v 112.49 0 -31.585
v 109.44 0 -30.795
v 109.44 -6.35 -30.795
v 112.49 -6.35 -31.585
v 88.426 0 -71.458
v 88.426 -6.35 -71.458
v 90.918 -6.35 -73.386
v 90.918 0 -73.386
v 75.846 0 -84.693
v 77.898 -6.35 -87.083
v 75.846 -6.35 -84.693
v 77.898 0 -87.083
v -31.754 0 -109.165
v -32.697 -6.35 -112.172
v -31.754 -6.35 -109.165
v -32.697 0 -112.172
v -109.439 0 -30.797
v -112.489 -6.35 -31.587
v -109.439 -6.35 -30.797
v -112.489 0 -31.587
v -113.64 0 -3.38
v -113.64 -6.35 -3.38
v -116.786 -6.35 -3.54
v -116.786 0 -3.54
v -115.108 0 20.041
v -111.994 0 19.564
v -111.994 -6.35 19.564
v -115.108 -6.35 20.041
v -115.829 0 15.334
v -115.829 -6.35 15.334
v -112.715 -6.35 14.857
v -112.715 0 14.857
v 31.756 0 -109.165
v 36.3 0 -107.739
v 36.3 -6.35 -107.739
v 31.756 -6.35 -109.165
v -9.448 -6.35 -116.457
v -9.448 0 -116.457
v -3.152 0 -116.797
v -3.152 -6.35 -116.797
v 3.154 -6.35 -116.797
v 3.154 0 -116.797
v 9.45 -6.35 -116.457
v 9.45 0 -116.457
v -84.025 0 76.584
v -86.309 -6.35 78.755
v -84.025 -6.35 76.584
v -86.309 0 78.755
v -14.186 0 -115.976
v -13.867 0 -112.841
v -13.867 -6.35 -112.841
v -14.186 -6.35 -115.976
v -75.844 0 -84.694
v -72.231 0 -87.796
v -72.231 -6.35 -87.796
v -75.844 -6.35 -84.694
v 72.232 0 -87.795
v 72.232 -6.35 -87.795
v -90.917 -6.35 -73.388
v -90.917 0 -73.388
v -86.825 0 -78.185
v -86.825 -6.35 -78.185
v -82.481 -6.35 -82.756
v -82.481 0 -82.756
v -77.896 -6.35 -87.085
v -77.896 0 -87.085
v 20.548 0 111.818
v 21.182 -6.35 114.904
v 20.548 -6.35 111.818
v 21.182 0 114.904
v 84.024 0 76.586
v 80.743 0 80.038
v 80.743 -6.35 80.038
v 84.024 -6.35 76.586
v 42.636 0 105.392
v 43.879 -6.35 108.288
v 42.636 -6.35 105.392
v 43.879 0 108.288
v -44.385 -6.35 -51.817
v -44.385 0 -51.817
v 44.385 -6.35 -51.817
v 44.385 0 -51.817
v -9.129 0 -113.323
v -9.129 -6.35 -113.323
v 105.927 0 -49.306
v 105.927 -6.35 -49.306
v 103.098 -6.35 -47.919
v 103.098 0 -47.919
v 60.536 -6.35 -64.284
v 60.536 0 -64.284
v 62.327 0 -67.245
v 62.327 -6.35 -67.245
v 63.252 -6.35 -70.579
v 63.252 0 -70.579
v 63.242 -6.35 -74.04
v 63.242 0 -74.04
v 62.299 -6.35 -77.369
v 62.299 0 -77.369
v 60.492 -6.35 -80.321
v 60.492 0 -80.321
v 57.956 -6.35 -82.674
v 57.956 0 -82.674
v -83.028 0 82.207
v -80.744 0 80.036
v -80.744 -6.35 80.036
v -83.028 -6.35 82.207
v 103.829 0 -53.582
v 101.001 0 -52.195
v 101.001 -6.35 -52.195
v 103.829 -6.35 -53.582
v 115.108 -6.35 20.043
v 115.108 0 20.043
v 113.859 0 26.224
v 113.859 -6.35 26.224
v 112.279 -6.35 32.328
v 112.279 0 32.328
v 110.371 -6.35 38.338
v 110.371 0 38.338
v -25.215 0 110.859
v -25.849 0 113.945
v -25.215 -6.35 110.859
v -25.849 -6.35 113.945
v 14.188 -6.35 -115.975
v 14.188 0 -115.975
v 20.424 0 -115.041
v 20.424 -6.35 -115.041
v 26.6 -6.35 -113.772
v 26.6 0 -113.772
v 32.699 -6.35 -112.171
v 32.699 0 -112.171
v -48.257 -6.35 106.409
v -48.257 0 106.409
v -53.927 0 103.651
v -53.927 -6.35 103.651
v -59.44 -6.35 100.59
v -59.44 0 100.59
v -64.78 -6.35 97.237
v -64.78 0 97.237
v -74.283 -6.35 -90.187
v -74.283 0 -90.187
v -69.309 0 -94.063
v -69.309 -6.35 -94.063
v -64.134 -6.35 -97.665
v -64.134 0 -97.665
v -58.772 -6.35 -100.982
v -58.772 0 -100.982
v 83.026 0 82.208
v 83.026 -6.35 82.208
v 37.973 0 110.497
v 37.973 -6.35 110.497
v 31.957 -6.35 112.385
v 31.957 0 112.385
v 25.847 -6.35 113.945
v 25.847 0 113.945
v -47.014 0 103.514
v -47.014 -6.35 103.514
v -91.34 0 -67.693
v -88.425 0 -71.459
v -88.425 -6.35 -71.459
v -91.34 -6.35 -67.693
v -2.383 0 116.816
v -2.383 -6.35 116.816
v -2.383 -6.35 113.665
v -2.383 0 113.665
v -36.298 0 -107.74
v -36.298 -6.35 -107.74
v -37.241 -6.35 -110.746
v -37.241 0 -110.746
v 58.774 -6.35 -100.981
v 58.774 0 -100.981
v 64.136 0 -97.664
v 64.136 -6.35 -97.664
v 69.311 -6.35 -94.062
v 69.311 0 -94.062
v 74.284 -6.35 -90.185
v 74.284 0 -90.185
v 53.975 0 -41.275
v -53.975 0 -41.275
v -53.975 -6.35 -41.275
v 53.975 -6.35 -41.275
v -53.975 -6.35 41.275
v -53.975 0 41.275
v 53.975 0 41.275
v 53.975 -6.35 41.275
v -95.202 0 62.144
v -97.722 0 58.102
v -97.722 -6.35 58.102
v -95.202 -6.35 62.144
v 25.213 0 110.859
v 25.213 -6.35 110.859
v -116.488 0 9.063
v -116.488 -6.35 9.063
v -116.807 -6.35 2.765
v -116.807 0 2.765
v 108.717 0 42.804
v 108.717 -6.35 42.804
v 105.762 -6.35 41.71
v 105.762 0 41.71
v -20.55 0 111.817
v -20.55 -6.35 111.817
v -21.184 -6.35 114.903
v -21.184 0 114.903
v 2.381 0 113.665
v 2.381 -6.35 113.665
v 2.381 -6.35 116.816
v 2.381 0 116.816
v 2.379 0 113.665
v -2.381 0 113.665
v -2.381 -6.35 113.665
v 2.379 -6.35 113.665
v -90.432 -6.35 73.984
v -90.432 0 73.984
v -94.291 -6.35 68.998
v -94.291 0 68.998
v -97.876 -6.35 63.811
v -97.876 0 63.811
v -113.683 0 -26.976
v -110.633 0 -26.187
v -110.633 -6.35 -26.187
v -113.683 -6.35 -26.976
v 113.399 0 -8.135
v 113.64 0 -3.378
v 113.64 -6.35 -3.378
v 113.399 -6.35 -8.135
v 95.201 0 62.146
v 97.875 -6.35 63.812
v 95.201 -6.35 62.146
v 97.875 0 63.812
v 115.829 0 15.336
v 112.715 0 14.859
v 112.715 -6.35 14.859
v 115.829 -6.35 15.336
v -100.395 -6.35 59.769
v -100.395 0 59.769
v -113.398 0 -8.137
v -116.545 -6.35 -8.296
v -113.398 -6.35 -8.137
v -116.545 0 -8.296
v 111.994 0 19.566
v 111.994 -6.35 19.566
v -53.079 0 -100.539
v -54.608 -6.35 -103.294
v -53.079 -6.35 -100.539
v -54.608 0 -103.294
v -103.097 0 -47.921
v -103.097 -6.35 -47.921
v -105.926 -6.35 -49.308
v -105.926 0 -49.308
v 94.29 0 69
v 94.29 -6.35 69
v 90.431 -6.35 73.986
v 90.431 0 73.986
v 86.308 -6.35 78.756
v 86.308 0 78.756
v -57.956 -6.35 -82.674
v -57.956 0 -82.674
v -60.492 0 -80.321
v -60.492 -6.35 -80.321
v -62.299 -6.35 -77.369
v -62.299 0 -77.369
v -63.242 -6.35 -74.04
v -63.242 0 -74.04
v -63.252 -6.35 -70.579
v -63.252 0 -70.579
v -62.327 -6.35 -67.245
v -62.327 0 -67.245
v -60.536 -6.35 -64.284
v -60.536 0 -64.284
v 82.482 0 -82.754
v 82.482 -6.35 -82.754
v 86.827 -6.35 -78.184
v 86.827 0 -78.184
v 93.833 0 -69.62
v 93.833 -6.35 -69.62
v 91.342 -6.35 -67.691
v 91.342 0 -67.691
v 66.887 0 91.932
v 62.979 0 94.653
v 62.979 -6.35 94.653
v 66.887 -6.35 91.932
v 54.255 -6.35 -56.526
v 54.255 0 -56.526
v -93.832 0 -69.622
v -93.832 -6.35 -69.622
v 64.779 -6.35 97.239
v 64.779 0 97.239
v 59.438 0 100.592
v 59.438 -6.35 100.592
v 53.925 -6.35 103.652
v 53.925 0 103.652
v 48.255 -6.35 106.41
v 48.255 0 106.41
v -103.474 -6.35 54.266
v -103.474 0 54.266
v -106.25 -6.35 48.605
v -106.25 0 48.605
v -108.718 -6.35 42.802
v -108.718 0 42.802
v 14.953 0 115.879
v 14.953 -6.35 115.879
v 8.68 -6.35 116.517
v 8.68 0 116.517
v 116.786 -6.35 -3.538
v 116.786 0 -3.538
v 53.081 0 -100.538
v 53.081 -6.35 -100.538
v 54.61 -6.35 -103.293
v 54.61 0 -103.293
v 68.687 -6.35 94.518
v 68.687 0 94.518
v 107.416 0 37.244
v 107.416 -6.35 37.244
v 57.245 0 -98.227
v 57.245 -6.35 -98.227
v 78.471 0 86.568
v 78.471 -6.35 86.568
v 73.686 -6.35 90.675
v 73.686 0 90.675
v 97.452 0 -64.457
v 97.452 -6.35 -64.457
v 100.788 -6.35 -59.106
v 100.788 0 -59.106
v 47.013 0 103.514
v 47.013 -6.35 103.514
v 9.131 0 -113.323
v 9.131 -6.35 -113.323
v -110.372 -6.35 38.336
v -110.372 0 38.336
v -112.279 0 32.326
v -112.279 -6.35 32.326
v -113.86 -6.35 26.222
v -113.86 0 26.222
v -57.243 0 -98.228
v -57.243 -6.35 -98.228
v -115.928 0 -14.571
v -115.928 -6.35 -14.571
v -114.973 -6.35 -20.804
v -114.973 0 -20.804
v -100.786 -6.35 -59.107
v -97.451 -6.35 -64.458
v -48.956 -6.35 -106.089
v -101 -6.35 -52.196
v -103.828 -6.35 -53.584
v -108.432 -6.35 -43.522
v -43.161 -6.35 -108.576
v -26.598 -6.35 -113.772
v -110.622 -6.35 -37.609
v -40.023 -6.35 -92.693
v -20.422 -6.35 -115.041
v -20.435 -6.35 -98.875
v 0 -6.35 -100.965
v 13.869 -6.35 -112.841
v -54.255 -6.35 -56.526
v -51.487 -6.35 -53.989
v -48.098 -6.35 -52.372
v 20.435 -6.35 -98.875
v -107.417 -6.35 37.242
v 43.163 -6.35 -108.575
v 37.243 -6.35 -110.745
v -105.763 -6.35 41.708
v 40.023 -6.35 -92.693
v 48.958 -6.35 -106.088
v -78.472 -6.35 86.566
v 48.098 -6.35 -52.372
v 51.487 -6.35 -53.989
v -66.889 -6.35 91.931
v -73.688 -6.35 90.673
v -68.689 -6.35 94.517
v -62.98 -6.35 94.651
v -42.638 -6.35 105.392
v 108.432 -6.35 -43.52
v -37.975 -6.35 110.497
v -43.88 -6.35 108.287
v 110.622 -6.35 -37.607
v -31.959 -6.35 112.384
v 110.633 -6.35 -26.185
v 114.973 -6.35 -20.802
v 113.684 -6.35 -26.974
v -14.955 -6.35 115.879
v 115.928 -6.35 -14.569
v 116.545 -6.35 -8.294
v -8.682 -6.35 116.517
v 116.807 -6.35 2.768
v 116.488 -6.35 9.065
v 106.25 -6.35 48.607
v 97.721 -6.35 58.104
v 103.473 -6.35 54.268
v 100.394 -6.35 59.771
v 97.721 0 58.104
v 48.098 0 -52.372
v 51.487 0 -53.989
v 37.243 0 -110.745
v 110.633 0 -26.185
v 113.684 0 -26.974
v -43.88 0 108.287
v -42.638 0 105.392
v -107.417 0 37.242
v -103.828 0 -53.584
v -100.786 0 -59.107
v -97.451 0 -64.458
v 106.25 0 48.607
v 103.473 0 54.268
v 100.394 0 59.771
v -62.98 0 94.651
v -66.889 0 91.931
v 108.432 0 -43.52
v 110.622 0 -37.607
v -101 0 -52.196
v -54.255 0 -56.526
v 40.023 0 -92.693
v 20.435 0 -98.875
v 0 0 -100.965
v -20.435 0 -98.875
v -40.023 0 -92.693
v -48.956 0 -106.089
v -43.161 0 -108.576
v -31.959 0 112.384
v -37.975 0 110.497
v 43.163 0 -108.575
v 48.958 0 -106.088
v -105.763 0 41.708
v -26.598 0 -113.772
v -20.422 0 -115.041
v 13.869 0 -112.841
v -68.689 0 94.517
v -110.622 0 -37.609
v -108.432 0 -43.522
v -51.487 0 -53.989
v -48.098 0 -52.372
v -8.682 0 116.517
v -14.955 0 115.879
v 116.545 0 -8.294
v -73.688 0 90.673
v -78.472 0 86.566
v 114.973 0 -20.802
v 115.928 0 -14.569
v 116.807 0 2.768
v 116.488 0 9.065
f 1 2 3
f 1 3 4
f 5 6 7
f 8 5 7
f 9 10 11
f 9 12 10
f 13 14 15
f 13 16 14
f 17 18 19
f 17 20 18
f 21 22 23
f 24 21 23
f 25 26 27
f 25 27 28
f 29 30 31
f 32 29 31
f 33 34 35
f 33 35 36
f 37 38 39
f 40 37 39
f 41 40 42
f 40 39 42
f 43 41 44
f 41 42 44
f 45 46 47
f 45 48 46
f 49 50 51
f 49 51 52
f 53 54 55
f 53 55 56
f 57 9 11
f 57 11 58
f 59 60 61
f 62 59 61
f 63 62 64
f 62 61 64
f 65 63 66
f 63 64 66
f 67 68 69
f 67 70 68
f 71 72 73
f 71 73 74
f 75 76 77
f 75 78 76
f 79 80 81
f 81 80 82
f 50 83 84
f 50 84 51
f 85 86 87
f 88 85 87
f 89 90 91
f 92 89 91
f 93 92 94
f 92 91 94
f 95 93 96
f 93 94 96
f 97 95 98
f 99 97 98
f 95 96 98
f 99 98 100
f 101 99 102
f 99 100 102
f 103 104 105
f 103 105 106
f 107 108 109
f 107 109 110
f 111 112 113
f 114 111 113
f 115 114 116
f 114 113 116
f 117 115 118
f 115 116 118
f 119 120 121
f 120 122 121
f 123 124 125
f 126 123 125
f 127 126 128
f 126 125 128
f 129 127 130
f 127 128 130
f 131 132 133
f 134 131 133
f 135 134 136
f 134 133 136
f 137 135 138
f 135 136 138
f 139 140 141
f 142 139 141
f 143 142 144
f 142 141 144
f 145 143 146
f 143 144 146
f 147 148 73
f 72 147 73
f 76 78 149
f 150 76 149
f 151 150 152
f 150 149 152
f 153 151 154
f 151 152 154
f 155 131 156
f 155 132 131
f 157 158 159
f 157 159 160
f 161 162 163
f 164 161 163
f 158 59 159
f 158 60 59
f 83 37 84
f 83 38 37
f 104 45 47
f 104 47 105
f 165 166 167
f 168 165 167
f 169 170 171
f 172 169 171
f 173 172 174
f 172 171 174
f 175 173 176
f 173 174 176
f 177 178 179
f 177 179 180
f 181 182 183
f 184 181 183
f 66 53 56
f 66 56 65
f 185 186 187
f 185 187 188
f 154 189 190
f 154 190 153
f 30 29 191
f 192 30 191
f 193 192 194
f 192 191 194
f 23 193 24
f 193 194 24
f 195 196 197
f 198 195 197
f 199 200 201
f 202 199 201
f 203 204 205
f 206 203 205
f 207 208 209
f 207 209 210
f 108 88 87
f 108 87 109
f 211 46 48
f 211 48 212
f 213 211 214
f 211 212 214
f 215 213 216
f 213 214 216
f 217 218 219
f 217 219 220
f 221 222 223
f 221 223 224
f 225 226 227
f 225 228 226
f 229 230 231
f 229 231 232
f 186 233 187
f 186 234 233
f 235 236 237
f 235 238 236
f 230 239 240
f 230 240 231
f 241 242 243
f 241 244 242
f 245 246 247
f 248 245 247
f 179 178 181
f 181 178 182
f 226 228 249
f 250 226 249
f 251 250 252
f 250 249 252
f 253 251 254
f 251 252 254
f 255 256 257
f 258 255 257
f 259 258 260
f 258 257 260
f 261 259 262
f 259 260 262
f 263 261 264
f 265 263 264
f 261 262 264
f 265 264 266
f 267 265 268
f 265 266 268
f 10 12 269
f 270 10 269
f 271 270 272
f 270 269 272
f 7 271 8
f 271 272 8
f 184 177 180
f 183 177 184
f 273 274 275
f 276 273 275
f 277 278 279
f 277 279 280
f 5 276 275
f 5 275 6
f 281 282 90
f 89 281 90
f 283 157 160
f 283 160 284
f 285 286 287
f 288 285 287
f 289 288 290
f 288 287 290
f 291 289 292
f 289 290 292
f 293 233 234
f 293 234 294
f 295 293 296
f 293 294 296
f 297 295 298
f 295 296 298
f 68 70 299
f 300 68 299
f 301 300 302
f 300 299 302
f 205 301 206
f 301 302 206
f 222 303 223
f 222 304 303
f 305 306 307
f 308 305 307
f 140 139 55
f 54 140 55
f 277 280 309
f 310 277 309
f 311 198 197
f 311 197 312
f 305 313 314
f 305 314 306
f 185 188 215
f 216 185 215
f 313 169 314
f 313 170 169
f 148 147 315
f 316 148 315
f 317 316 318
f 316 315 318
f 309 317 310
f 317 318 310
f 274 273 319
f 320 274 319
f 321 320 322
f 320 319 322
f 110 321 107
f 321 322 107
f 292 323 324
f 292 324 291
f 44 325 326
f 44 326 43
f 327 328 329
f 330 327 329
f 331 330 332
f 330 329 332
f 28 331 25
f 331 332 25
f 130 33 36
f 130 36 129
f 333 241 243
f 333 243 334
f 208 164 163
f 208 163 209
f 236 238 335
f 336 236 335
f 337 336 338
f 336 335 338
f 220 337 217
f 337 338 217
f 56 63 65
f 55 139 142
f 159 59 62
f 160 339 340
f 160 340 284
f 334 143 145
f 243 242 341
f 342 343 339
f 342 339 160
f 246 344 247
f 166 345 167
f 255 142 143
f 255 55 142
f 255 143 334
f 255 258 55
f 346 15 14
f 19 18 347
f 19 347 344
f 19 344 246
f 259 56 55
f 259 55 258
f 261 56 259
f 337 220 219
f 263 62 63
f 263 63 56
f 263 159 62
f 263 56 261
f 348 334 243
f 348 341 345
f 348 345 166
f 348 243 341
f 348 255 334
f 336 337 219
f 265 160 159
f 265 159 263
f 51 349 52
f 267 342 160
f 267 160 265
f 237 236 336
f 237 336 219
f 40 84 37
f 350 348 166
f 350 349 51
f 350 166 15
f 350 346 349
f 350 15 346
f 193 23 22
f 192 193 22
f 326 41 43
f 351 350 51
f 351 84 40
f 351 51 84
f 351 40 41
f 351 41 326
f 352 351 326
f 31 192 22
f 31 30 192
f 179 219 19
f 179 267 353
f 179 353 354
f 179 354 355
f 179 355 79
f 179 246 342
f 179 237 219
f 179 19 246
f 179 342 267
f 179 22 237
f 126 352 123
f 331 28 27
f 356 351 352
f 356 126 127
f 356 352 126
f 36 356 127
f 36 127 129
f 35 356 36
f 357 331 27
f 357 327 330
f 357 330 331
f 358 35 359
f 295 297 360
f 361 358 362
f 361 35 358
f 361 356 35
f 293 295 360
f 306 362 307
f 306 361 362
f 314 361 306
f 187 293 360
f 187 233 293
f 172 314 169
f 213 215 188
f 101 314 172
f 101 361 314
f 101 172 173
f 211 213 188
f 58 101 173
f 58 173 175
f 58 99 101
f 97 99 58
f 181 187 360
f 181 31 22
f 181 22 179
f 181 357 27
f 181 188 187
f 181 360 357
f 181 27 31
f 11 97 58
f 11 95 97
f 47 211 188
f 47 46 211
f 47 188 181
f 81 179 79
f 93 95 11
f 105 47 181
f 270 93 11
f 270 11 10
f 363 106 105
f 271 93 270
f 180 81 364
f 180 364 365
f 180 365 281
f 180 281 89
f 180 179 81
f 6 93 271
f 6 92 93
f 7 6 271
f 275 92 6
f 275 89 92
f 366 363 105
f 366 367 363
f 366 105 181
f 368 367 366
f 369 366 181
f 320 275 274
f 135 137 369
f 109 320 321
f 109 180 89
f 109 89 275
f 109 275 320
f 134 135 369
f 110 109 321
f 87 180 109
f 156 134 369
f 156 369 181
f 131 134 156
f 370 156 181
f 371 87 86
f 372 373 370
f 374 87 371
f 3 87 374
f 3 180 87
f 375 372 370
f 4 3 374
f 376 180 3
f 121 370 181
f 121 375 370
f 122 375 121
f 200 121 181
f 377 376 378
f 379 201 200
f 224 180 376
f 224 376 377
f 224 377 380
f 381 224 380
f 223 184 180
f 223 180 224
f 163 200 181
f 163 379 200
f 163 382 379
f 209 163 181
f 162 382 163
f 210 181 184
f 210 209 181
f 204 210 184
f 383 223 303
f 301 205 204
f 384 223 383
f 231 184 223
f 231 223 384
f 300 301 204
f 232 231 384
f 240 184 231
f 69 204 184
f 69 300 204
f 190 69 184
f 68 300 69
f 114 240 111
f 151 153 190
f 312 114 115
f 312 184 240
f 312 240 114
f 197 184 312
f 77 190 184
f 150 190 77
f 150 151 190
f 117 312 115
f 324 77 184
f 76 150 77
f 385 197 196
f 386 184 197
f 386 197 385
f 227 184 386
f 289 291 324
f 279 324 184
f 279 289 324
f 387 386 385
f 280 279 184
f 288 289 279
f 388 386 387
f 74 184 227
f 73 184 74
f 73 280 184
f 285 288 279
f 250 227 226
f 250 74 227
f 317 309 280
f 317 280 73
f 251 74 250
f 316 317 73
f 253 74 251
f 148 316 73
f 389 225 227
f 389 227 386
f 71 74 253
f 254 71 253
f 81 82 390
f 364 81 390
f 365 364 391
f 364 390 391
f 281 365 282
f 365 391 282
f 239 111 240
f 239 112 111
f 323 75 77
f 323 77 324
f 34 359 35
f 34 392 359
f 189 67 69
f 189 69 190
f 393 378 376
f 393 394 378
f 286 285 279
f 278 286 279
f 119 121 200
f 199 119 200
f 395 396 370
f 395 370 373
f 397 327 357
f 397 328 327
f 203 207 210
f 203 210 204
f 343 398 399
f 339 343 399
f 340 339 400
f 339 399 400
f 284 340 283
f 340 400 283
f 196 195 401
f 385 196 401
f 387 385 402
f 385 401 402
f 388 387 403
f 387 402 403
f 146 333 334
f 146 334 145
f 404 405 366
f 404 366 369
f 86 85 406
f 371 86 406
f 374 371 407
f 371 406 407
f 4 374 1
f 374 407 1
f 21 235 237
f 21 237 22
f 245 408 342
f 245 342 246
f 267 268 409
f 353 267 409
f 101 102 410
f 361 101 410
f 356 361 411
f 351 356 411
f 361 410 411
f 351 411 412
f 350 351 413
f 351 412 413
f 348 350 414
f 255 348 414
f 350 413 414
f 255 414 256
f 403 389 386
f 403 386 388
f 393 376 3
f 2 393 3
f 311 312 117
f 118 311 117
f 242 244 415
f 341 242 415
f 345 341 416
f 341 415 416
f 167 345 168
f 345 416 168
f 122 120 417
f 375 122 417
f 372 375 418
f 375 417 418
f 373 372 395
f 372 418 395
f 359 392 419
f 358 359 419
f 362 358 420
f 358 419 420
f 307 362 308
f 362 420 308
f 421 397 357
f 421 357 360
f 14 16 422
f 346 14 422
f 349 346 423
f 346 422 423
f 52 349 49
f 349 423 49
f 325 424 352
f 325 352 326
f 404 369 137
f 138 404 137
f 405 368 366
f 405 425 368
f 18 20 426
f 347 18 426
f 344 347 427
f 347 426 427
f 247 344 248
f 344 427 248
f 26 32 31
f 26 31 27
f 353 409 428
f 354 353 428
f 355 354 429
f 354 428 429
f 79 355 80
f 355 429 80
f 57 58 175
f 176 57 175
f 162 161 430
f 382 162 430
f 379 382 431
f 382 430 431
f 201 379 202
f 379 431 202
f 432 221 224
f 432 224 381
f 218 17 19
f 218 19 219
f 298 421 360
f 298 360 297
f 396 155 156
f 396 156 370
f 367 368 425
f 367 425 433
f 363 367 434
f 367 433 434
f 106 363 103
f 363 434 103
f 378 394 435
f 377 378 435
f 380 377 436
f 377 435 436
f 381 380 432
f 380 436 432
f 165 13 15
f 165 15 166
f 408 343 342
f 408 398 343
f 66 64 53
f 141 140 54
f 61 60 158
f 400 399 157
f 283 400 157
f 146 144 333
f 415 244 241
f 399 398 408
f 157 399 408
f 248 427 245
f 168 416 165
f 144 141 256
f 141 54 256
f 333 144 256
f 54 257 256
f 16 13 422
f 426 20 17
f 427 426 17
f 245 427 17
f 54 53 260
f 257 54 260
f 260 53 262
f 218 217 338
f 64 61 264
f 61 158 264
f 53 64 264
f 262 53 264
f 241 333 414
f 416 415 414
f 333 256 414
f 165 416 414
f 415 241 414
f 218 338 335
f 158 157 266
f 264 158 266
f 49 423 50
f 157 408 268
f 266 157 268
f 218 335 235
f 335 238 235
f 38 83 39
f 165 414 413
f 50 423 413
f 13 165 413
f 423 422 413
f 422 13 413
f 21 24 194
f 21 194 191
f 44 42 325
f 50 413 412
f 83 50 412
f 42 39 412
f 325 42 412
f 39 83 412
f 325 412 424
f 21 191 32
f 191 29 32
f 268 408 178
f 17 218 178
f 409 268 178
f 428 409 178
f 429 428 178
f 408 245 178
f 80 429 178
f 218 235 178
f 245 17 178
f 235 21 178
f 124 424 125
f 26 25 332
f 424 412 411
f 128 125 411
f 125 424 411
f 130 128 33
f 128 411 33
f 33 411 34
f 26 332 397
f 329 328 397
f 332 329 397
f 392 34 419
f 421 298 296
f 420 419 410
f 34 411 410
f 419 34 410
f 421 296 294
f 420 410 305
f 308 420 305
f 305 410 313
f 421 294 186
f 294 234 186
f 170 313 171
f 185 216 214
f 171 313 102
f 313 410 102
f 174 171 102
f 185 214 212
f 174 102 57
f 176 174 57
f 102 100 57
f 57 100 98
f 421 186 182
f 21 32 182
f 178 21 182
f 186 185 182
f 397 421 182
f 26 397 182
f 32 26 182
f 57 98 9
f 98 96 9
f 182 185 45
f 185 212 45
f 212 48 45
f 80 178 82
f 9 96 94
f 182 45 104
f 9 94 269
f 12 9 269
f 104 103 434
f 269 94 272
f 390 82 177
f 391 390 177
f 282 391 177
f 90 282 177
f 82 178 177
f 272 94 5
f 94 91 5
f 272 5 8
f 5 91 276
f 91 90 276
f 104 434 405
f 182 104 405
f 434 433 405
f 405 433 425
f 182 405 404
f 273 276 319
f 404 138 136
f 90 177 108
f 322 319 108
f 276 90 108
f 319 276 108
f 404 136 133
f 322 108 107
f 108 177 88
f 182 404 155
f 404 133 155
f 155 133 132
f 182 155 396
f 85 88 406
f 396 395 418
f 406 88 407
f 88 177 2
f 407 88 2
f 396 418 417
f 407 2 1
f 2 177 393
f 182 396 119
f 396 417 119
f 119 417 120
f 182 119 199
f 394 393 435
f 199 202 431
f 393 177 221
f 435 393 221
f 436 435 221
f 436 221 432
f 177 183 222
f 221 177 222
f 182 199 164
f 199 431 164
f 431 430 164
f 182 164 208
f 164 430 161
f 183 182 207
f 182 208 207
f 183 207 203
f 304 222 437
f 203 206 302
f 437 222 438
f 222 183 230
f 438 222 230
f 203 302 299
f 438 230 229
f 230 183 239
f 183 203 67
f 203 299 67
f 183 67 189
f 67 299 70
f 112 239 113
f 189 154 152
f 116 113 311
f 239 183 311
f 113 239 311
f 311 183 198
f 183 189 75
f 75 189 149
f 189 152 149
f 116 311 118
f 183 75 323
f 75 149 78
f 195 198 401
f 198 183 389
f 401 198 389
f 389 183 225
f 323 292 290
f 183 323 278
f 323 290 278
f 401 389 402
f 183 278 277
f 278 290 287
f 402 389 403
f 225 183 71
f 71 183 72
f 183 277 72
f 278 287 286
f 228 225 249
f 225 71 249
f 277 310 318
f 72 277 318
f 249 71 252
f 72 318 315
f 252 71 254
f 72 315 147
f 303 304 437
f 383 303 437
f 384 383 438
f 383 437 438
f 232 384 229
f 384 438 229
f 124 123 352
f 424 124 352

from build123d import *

# Parameters (mm, degrees)
F0_R     = 116.84
F0_W     = 107.95
F0_H     = 82.55
F1_DEPTH = 6.35
F3_DEPTH = 12.7


# Not quite as in the source:
# - ends of sketch curves that miss each other by under 0.0002 mm in the source are joined


with BuildPart() as f1:
    # F0 (on Front) → F1 (new body)
    with BuildSketch(Plane.XZ):
        Circle(F0_R)
        with BuildLine():
            ThreePointArc((57.9557025683, -82.6744686394), (0, -100.965), (-57.9557025683, -82.6744686394))
            ThreePointArc((-57.9557025683, -82.6744686394), (-63.2424676953, -74.0399131217), (-60.5362426444, -64.283798092))
            Line((-60.5362426444, -64.283798092), (-54.2551455528, -56.5256778711))
            ThreePointArc((-54.2551455528, -56.5256778711), (-49.8526531391, -53.0544887955), (-44.3845799964, -51.8170441872))
            Line((-44.3845799964, -51.8170441872), (44.3845799964, -51.8170441872))
            ThreePointArc((44.3845799964, -51.8170441872), (49.8526531391, -53.0544887955), (54.2551455528, -56.5256778711))
            Line((54.2551455528, -56.5256778711), (60.5362426444, -64.283798092))
            ThreePointArc((60.5362426444, -64.283798092), (63.2424676953, -74.0399131217), (57.9557025683, -82.6744686394))
        make_face(mode=Mode.SUBTRACT)
        Rectangle(F0_W, F0_H, mode=Mode.SUBTRACT)
    extrude(amount=F1_DEPTH)

    # F2 (on face) → F3 (cut, symmetric)
    with BuildSketch(Plane.XZ.offset(6.35)):
        Polygon((2.3792107569, 116.84), (-2.38125, 116.84), (-2.38125, 113.665), (2.3792661711, 113.665), align=None)
        Polygon((-2.38125, 113.665), (-2.38125, 116.84), (-2.3832892423, 116.8399584216), (-2.3832338281, 113.664958422), align=None)
        Polygon((2.38125, 116.84), (2.3792107569, 116.84), (2.3792661711, 113.6650415433), (2.38125, 113.665), align=None)
        Polygon((25.8521605942, 113.96895079), (21.1871487092, 114.9276323655), (20.5480276589, 111.8176244422), (25.2130395439, 110.8589428667), align=None)
        Polygon((48.2646865559, 106.4320251767), (43.8881478633, 108.3101400086), (42.6360713087, 105.3924475469), (47.0126100013, 103.514332715), align=None)
        Polygon((68.7012615192, 94.537784072), (64.7923710351, 97.2584423441), (62.9785988537, 94.6525153548), (66.8874893377, 91.9318570826), align=None)
        Polygon((86.3252143359, 78.7731764081), (83.0440016102, 82.2249946678), (80.742789437, 80.0375195173), (84.0240021628, 76.5857012576), align=None)
        Polygon((100.415022302, 59.7836035017), (97.8958198253, 63.8252646864), (95.2013790356, 62.1457963686), (97.7205815122, 58.1041351839), align=None)
        Polygon((110.3938502174, 38.3464963946), (108.7397938642, 42.8125353365), (105.7624345696, 41.709831101), (107.4164909228, 37.2437921591), align=None)
        Polygon((115.8531659566, 15.3394879114), (115.1319726134, 20.0470654638), (111.9935875785, 19.5662699016), (112.7147809217, 14.8586923493), align=None)
        Polygon((116.5694657294, -8.2955175322), (116.8106609728, -3.5391290804), (113.6397353383, -3.3783322514), (113.3985400948, -8.1347207032), align=None)
        Polygon((112.5134243011, -31.5909053937), (113.7071336244, -26.9804320664), (110.6334847395, -26.184625851), (109.4397754163, -30.7950991782), align=None)
        Polygon((103.8510955651, -53.5929650372), (105.9484486388, -49.3171591092), (103.0979113534, -47.9189237267), (101.0005582798, -52.1947296548), align=None)
        Polygon((90.9371143142, -73.4009345429), (93.8522457324, -69.6348470419), (91.3415207317, -67.6914260965), (88.4263893136, -71.4575135974), align=None)
        Polygon((74.3001775309, -90.2038778015), (77.9137421316, -87.1016919389), (75.8456182231, -84.6926488717), (72.2320536224, -87.7948347344), align=None)
        Polygon((54.6213995909, -103.3138841506), (58.7854584338, -101.0026030768), (57.2446043846, -98.2265638481), (53.0805455416, -100.537844922), align=None)
        Polygon((32.7064275147, -112.1942313615), (37.2505044854, -110.7684786712), (36.300002692, -107.7390940241), (31.7559257212, -109.1648467143), align=None)
        Polygon((9.4524578666, -116.4813589886), (14.1905189501, -115.9995048416), (13.869282852, -112.8407974526), (9.1312217685, -113.3226515996), align=None)
        Polygon((-14.1884943746, -115.9997524952), (-9.4504248819, -116.4815239474), (-9.1292439138, -113.3228109523), (-13.8673134065, -112.8410395), align=None)
        Polygon((-37.2485712051, -110.7691287983), (-32.704469351, -112.1948021792), (-31.7540204304, -109.1654009431), (-36.2981222845, -107.7397275622), align=None)
        Polygon((-58.7836955969, -101.0036290612), (-54.6195964151, -103.3148374582), (-53.0787908171, -100.538771337), (-57.2428899989, -98.22756294), align=None)
        Polygon((-77.9122219084, -87.1030517769), (-74.2986031649, -90.2051745705), (-72.2305213025, -87.7960954082), (-75.844140046, -84.6939726146), align=None)
        Polygon((-93.8510303607, -69.636485062), (-90.9358332124, -73.4025216837), (-88.4251421312, -71.4590569182), (-91.3403392796, -67.6930202964), align=None)
        Polygon((-105.9475878758, -49.3190082509), (-103.8501601756, -53.5947775726), (-100.9996472945, -52.1964924391), (-103.0970749947, -47.9207231174), align=None)
        Polygon((-113.7066627097, -26.9824166262), (-112.5128729187, -31.5928691186), (-109.4392379237, -30.797009258), (-110.6330277147, -26.1865567655), align=None)
        Polygon((-116.8105991856, -3.5411678105), (-116.5693209275, -8.2975520519), (-113.3983980999, -8.1366998799), (-113.639676358, -3.3803156385), align=None)
        Polygon((-115.1323224832, 20.0450560288), (-115.8534336636, 15.3374658899), (-112.7150402377, 14.856725103), (-111.9939290573, 19.5643152418), align=None)
        Polygon((-108.7405410673, 42.8106374625), (-110.3945194732, 38.3445696526), (-107.4171409332, 37.241917382), (-105.7631625274, 41.707985192), align=None)
        Polygon((-97.8969337715, 63.8235560723), (-100.4160657074, 59.7818509198), (-97.7215956058, 58.1024296292), (-95.2024636698, 62.1441347816), align=None)
        Polygon((-83.0454366945, 82.2235452641), (-86.3265891741, 78.7716697368), (-84.0253388226, 76.5842347504), (-80.744186343, 80.0361102776), align=None)
        Polygon((-64.7940685053, 97.2573114891), (-68.7029115043, 94.5365849944), (-66.8890938411, 91.9306896617), (-62.9802508421, 94.6514161565), align=None)
        Polygon((-43.8900382252, 108.3093739995), (-48.2665441378, 106.4311827828), (-47.0144166601, 103.5135121744), (-42.6379107474, 105.391703391), align=None)
        Polygon((-21.1891545716, 114.9272625625), (-25.8541497237, 113.9684995673), (-25.2149743936, 110.8585027993), (-20.5499792415, 111.8172657944), align=None)
    extrude(amount=F3_DEPTH, both=True, mode=Mode.SUBTRACT)


with BuildPart() as f4_1:
    # F4: copy of F1
    add(f1.part.moved(Location((0, 87.3125, 0))))


solid = f1.part
